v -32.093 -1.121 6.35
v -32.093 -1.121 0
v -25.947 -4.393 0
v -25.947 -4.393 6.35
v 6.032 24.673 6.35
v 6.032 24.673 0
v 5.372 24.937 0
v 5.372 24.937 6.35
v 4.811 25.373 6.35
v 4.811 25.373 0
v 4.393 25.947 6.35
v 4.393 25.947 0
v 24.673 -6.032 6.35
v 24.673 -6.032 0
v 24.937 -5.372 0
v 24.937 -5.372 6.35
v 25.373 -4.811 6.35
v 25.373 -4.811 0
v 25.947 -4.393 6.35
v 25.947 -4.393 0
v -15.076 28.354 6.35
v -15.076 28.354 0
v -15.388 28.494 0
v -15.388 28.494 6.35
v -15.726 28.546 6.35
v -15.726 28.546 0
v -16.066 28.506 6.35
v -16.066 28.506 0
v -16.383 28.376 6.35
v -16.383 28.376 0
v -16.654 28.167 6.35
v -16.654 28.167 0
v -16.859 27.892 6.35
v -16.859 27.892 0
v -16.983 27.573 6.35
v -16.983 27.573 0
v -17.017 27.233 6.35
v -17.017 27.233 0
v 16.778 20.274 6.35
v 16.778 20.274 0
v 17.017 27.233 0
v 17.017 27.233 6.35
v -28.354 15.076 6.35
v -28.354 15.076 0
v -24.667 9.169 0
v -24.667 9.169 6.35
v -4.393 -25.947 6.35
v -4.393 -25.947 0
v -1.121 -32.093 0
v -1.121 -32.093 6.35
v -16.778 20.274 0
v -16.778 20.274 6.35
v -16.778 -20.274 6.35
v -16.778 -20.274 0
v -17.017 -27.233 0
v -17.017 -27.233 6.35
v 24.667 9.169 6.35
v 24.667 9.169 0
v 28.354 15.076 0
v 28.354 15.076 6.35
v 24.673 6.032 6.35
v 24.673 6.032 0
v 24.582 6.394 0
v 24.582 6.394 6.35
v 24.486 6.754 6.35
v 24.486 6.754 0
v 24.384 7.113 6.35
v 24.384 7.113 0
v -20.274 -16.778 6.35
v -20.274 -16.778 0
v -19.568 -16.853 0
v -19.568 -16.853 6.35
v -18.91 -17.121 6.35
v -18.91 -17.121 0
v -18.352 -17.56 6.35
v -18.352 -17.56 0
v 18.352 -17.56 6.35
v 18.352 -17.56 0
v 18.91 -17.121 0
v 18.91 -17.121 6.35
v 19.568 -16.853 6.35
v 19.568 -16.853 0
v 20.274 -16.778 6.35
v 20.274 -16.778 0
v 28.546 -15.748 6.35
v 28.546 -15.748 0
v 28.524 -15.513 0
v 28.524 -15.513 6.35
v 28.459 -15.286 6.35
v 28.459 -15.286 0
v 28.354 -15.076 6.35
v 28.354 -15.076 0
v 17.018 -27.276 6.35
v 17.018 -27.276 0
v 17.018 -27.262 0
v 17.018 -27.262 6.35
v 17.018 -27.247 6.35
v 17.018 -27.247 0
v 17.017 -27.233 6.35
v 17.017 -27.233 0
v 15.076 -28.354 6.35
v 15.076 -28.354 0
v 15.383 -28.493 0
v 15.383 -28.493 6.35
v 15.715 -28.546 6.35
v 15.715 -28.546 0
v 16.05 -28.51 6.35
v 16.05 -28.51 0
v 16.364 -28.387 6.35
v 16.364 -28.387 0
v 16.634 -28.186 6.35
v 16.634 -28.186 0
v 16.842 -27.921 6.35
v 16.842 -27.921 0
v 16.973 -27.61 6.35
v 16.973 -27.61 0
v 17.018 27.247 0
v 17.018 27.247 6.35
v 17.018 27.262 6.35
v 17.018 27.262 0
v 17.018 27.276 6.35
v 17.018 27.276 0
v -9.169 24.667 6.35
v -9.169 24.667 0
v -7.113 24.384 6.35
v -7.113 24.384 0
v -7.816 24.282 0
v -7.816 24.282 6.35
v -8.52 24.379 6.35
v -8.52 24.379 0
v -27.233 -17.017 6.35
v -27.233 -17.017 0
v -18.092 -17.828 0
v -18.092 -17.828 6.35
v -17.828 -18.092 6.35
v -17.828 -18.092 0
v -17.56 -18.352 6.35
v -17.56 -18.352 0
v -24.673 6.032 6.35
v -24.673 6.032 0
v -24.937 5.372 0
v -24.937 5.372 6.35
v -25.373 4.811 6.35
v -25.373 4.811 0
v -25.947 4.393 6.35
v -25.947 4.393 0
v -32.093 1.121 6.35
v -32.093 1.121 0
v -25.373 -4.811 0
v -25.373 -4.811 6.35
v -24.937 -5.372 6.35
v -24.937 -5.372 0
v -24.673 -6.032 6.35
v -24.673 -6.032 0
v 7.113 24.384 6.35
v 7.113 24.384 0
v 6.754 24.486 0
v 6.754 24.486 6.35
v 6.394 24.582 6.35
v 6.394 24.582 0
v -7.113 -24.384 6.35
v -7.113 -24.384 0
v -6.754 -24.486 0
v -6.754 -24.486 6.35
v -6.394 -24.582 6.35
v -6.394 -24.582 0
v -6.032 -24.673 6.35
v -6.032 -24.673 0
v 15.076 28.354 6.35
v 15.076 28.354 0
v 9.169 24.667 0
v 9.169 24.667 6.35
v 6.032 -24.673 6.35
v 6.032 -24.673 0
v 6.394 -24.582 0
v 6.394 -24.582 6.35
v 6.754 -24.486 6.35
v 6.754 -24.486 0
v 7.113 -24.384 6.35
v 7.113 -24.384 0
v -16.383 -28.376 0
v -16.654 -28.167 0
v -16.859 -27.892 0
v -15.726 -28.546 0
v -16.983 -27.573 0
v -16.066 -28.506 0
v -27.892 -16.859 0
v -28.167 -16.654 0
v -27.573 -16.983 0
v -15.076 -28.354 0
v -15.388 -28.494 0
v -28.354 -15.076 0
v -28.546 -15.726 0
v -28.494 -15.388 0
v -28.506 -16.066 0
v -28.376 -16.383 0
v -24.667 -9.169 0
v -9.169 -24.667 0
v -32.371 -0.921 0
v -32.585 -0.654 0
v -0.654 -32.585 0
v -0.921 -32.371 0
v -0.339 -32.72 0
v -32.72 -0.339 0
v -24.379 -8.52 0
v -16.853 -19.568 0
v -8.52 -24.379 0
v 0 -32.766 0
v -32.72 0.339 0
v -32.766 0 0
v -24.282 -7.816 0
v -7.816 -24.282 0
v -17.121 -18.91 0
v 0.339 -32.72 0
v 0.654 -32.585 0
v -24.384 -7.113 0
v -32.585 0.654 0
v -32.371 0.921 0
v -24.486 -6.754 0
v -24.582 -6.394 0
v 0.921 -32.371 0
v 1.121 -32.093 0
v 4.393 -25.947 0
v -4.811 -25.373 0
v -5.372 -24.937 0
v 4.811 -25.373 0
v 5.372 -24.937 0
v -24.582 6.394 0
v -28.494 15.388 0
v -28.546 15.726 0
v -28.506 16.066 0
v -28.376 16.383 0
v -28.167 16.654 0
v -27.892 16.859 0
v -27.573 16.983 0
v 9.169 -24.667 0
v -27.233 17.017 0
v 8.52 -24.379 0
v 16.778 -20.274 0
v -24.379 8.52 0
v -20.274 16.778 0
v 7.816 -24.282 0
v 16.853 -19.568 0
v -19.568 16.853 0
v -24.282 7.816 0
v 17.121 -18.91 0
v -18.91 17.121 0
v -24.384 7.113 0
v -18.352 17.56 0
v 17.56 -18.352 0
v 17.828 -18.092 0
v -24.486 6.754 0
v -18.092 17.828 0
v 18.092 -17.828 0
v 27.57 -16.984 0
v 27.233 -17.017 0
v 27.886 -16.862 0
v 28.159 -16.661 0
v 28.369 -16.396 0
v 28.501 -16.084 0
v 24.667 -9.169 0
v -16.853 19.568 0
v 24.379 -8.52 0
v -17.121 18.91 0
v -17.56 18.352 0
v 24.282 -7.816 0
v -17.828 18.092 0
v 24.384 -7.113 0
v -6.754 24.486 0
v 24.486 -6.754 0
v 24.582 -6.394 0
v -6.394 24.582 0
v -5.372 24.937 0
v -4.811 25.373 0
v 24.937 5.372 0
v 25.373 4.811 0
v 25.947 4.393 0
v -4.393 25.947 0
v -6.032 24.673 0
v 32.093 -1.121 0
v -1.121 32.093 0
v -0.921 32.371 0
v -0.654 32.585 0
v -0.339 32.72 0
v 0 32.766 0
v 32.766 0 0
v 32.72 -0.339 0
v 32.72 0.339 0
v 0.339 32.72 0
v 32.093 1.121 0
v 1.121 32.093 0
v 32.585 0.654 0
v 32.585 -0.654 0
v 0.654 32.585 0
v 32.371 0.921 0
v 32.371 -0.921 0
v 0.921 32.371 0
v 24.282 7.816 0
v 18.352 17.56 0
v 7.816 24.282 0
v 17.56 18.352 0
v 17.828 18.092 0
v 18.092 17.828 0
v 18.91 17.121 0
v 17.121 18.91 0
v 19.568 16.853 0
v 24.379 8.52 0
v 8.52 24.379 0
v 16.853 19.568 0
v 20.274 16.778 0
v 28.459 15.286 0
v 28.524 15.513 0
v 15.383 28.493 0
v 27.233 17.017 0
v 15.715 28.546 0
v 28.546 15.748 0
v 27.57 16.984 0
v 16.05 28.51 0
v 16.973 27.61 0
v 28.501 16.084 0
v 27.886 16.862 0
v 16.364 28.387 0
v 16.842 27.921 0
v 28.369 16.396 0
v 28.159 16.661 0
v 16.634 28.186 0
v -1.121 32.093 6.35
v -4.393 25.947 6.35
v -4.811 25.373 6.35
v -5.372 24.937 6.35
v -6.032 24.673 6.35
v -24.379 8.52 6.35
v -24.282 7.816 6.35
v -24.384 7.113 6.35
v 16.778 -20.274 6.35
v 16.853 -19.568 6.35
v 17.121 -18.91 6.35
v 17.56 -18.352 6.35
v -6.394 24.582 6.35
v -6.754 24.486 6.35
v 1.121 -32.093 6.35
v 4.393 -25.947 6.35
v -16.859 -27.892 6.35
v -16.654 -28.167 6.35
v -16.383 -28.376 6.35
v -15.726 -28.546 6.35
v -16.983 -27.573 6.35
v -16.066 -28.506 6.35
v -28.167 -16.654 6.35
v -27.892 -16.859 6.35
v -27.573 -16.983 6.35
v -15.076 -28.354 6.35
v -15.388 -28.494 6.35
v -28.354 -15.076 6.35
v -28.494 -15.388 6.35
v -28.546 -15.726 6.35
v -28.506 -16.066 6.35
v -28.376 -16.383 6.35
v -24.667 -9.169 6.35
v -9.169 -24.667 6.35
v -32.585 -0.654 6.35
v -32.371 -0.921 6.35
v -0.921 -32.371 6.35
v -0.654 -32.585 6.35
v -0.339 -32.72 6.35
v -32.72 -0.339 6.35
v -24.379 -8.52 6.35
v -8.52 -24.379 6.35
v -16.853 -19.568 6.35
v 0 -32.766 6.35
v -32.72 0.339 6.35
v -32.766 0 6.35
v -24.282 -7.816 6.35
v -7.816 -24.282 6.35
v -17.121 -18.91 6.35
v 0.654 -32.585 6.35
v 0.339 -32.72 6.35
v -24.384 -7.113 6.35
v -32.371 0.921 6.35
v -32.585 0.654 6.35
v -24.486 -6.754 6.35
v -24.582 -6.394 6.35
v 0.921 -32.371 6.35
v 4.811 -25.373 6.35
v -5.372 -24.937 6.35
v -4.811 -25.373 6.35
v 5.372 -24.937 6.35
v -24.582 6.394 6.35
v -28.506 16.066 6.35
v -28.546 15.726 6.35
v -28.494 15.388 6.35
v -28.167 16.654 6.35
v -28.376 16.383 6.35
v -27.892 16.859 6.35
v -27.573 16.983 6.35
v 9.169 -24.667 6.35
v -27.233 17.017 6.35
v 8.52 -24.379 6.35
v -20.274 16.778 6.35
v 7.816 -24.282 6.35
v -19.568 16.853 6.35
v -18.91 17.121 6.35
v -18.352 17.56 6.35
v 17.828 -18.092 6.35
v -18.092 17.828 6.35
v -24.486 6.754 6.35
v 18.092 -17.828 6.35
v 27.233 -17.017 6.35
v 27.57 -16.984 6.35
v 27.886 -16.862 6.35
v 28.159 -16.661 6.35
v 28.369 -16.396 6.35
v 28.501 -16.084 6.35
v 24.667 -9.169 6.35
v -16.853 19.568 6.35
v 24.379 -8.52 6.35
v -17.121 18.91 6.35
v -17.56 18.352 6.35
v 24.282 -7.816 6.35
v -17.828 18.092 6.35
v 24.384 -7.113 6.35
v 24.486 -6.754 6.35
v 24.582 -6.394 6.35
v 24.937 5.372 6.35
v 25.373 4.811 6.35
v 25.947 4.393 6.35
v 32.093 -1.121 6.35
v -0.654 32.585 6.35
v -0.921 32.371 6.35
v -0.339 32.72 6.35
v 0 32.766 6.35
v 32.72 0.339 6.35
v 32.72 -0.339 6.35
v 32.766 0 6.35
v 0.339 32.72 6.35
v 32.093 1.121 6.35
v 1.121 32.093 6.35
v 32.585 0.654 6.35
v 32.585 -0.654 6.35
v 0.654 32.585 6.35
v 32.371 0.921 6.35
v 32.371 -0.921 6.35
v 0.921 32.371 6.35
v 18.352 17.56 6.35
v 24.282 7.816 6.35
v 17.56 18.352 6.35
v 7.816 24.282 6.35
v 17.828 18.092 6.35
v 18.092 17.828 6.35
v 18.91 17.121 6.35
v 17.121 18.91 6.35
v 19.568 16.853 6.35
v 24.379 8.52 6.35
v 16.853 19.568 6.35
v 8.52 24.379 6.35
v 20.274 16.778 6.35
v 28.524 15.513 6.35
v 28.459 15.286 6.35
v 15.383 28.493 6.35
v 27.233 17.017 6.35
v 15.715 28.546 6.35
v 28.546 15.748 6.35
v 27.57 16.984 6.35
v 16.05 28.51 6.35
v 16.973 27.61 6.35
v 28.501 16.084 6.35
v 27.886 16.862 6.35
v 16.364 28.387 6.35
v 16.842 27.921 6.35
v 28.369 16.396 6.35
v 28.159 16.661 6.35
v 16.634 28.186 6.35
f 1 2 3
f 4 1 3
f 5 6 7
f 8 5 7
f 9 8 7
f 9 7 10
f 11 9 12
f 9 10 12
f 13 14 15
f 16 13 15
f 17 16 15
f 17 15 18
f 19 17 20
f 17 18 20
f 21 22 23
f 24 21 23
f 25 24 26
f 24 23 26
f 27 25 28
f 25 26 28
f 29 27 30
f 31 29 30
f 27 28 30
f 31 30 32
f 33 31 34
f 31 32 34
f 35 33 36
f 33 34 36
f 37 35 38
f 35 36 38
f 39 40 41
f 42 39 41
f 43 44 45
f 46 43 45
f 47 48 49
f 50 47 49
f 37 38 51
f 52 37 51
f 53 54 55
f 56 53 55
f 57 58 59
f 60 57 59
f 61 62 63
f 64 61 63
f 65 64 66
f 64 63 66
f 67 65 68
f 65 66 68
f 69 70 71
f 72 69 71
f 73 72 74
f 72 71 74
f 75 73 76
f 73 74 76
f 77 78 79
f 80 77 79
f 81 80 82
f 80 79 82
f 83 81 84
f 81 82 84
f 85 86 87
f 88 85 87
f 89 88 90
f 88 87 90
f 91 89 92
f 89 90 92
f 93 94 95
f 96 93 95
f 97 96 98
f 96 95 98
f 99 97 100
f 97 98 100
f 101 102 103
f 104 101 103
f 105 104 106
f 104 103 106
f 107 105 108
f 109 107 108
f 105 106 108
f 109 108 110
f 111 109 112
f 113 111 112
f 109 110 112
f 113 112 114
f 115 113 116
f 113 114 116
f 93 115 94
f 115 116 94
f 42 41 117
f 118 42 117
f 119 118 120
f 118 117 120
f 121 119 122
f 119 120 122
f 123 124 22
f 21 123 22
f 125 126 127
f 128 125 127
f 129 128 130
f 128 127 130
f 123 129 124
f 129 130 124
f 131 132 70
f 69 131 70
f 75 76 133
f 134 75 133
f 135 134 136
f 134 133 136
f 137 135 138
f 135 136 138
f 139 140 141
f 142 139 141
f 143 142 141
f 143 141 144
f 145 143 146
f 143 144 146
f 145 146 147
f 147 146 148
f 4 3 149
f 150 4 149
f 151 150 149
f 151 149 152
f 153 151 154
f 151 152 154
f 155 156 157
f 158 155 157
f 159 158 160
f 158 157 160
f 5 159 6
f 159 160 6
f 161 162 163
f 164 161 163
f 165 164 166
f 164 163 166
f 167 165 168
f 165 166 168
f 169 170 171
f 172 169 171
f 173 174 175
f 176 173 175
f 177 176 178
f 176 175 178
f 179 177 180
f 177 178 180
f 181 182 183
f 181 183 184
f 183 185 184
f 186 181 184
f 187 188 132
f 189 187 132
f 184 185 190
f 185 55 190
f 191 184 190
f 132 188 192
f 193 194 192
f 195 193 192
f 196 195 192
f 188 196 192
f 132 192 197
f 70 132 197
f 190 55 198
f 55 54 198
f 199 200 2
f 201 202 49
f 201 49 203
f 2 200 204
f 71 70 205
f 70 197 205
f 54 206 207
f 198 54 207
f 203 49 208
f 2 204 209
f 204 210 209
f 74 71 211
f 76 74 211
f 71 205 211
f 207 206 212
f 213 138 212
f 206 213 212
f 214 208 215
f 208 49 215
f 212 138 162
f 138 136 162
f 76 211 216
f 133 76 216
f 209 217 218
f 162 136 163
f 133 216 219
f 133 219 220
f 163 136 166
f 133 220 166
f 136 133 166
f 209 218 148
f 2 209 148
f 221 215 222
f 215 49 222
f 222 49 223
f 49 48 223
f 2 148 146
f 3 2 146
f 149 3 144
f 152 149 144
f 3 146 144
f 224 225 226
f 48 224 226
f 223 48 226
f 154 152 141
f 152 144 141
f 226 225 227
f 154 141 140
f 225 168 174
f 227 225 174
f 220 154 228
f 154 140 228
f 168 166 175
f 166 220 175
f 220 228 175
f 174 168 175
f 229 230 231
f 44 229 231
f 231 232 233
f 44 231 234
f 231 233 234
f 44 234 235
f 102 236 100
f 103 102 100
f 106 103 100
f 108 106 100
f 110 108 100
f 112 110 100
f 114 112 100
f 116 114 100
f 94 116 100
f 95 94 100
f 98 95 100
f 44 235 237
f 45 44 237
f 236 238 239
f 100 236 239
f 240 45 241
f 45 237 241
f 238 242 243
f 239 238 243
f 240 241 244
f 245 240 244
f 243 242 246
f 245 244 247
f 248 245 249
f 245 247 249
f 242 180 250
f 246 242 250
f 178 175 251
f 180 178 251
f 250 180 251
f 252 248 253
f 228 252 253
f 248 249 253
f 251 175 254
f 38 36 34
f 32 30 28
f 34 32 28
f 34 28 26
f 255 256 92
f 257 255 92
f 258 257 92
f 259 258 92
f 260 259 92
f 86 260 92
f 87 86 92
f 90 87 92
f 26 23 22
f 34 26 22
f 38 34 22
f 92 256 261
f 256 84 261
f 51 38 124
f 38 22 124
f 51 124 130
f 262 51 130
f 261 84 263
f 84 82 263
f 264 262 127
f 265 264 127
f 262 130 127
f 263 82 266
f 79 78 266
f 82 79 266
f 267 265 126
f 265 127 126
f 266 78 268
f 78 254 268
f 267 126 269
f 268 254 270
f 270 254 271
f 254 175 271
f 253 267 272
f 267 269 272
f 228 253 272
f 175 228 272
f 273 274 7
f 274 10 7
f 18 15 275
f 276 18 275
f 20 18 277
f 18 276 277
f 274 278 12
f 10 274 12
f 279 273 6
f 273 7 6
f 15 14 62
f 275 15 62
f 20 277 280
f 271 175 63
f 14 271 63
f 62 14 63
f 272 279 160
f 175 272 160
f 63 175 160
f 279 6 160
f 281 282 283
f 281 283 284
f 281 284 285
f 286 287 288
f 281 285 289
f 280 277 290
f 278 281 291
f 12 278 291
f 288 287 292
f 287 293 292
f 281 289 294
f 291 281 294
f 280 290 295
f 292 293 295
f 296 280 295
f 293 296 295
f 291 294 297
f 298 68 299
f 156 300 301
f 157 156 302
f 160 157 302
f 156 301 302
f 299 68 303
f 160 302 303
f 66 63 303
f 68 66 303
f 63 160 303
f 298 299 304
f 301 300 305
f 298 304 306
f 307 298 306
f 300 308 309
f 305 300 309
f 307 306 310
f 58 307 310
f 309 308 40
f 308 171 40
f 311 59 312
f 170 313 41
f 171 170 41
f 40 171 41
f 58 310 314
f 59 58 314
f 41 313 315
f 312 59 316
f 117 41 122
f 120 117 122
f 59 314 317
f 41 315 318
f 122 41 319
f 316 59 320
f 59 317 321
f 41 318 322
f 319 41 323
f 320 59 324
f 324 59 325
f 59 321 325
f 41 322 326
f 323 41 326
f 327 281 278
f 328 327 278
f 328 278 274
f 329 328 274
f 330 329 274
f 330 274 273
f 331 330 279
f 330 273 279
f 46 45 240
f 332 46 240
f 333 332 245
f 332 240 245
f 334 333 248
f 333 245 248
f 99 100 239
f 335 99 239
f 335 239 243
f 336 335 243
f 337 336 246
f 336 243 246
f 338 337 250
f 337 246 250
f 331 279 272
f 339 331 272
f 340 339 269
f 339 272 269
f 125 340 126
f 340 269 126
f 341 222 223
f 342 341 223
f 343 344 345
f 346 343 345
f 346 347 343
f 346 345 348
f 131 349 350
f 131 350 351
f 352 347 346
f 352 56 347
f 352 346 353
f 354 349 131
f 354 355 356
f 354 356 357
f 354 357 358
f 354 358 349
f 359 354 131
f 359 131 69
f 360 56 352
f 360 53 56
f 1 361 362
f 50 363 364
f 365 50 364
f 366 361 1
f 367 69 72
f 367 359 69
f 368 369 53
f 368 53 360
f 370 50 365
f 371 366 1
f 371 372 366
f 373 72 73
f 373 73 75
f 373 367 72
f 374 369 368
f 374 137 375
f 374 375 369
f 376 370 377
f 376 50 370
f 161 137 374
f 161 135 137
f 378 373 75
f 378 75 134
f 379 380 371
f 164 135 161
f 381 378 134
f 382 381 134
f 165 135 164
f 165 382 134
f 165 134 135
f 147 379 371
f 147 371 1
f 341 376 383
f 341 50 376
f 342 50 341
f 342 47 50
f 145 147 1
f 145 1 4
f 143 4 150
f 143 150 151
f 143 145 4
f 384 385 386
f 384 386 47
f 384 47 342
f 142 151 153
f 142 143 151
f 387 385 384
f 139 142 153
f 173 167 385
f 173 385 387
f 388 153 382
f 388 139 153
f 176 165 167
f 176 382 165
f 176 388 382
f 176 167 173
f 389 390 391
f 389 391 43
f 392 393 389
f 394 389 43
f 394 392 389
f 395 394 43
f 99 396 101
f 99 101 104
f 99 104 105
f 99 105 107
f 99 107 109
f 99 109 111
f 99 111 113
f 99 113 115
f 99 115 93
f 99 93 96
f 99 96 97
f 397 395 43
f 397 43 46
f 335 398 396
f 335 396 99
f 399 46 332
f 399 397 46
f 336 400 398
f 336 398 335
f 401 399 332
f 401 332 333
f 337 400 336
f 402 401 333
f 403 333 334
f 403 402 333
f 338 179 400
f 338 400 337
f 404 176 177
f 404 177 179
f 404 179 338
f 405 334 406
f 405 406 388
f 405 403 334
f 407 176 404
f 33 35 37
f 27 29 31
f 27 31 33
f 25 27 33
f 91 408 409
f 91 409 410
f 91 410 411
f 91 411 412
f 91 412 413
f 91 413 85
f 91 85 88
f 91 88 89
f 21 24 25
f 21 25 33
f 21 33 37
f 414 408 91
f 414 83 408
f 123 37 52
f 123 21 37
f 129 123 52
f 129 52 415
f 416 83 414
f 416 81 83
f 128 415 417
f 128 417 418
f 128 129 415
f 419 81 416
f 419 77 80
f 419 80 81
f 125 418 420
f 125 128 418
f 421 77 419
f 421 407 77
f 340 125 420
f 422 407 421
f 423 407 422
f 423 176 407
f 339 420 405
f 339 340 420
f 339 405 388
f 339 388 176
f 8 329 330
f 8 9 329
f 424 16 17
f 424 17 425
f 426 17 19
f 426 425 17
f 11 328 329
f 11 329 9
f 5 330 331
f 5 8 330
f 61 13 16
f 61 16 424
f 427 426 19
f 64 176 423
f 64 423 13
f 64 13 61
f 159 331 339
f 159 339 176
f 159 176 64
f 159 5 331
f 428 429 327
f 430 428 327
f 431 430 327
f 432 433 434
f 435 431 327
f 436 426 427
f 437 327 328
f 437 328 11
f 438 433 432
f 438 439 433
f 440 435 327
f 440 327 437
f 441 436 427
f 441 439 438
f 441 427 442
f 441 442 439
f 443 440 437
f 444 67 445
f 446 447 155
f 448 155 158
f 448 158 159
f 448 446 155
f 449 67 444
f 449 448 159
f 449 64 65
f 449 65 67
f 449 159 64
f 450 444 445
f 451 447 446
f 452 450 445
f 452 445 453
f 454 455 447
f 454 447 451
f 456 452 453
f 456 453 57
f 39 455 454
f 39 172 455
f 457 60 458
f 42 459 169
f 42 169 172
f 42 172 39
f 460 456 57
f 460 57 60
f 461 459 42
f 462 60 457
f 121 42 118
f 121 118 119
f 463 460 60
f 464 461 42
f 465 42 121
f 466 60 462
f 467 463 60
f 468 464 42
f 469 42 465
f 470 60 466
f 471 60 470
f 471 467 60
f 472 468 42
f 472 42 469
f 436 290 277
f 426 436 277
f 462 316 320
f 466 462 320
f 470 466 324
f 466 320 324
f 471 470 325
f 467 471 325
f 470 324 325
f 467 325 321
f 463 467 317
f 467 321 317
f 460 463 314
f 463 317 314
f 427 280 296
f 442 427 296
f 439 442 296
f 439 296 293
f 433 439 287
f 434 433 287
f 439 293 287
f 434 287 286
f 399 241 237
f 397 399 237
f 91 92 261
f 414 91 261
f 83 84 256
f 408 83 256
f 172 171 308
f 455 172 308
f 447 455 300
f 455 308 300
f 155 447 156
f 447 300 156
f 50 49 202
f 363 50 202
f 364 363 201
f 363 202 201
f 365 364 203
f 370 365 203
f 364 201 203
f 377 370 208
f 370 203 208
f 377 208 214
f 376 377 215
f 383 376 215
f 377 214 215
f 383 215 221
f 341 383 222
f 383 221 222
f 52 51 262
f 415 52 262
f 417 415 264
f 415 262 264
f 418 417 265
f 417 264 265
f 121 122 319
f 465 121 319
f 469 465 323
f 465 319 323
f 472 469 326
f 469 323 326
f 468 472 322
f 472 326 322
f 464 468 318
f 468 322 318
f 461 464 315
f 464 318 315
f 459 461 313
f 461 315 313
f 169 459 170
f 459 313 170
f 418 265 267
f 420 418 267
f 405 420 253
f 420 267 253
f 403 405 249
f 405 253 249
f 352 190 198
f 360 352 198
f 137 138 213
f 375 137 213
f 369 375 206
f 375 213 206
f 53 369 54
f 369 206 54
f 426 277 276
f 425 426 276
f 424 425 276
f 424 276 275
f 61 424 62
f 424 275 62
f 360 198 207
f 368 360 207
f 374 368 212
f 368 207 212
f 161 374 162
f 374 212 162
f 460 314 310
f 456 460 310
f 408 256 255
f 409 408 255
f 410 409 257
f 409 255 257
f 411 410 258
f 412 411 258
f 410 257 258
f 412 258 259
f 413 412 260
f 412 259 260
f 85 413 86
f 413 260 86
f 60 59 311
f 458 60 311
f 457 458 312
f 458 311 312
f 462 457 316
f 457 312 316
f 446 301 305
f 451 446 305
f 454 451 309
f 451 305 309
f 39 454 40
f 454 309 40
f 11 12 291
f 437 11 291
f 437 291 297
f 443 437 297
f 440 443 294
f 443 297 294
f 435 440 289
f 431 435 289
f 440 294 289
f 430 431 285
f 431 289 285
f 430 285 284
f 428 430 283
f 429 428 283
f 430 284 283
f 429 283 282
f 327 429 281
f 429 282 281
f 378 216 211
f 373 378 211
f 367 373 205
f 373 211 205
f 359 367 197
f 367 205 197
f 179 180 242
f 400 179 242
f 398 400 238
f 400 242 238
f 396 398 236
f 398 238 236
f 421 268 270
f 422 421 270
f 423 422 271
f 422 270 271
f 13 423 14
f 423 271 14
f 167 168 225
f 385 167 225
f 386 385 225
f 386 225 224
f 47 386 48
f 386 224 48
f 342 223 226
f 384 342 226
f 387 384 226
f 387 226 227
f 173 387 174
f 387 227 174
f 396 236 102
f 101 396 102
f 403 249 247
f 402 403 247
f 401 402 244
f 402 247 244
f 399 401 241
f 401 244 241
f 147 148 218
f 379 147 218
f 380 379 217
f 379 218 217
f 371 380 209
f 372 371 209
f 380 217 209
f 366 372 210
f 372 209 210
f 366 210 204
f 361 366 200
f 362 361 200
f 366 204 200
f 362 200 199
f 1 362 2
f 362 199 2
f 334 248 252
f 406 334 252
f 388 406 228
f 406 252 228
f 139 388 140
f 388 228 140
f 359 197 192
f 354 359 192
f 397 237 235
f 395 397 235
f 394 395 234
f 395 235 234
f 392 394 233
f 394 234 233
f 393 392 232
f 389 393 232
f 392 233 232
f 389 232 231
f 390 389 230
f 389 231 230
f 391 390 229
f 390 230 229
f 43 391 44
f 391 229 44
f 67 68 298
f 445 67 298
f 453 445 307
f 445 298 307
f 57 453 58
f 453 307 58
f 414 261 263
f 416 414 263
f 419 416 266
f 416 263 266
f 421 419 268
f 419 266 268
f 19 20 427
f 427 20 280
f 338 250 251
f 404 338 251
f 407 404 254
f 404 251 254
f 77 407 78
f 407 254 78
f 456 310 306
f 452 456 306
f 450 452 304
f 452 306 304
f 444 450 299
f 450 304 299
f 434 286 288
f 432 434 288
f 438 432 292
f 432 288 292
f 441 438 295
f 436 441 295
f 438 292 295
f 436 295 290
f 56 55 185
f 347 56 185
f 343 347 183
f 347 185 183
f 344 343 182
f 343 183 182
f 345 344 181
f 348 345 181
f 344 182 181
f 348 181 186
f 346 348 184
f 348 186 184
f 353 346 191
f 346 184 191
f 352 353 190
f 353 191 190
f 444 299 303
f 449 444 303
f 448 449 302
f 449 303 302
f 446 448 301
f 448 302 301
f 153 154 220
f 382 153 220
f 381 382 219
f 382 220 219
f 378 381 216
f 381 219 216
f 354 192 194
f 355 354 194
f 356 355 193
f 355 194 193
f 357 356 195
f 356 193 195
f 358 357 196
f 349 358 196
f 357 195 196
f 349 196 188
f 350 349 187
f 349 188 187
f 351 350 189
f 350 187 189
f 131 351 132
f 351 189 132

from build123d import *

# Parameters (mm, degrees)
F1_DEPTH = 6.35


with BuildPart() as f1:
    # F0 (on Top) → F1 (new body)
    with BuildSketch(Plane.XY):
        with BuildLine():
            ThreePointArc((-4.39292013, 25.9471153947), (-5.0763171932, 25.1352197323), (-6.031797544, 24.6734152153))
            ThreePointArc((-6.031797544, 24.6734152153), (-6.5740037456, 24.5345159877), (-7.1130177041, 24.3837031466))
            ThreePointArc((-7.1130177041, 24.3837031466), (-12.7, 21.9970452561), (-17.5603975113, 18.3519056026))
            ThreePointArc((-17.5603975113, 18.3519056026), (-17.9605122421, 17.9605122421), (-18.3519056026, 17.5603975113))
            ThreePointArc((-18.3519056026, 17.5603975113), (-21.9970452561, 12.7), (-24.3837031466, 7.1130177041))
            ThreePointArc((-24.3837031466, 7.1130177041), (-24.5345159877, 6.5740037456), (-24.6734152153, 6.031797544))
            ThreePointArc((-24.6734152153, 6.031797544), (-25.4, 0), (-24.6734152153, -6.031797544))
            ThreePointArc((-24.6734152153, -6.031797544), (-24.5345159877, -6.5740037456), (-24.3837031466, -7.1130177041))
            ThreePointArc((-24.3837031466, -7.1130177041), (-21.9970452561, -12.7), (-18.3519056026, -17.5603975113))
            ThreePointArc((-18.3519056026, -17.5603975113), (-17.9605122421, -17.9605122421), (-17.5603975113, -18.3519056026))
            ThreePointArc((-17.5603975113, -18.3519056026), (-12.7, -21.9970452561), (-7.1130177041, -24.3837031466))
            ThreePointArc((-7.1130177041, -24.3837031466), (-6.5740037456, -24.5345159877), (-6.031797544, -24.6734152153))
            ThreePointArc((-6.031797544, -24.6734152153), (0, -25.4), (6.031797544, -24.6734152153))
            ThreePointArc((6.031797544, -24.6734152153), (6.5740037456, -24.5345159877), (7.1130177041, -24.3837031466))
            ThreePointArc((7.1130177041, -24.3837031466), (12.7, -21.9970452561), (17.5603975113, -18.3519056026))
            ThreePointArc((17.5603975113, -18.3519056026), (17.9605122421, -17.9605122421), (18.3519056026, -17.5603975113))
            ThreePointArc((18.3519056026, -17.5603975113), (21.9970452561, -12.7), (24.3837031466, -7.1130177041))
            ThreePointArc((24.3837031466, -7.1130177041), (24.5345159877, -6.5740037456), (24.6734152153, -6.031797544))
            ThreePointArc((24.6734152153, -6.031797544), (25.4, 0), (24.6734152153, 6.031797544))
            ThreePointArc((24.6734152153, 6.031797544), (24.5345159877, 6.5740037456), (24.3837031466, 7.1130177041))
            ThreePointArc((24.3837031466, 7.1130177041), (21.9970452561, 12.7), (18.3519056026, 17.5603975113))
            ThreePointArc((18.3519056026, 17.5603975113), (17.9605122421, 17.9605122421), (17.5603975113, 18.3519056026))
            ThreePointArc((17.5603975113, 18.3519056026), (12.7, 21.9970452561), (7.1130177041, 24.3837031466))
            ThreePointArc((7.1130177041, 24.3837031466), (6.5740037456, 24.5345159877), (6.031797544, 24.6734152153))
            ThreePointArc((6.031797544, 24.6734152153), (5.0763171932, 25.1352197323), (4.39292013, 25.9471153947))
            Line((4.39292013, 25.9471153947), (1.1210285842, 32.0928206711))
            ThreePointArc((1.1210285842, 32.0928206711), (1.2321944453, 31.8035660076), (1.27, 31.496))
            ThreePointArc((1.27, 31.496), (0.8980256121, 30.5979743879), (0, 30.226))
            ThreePointArc((0, 30.226), (-1.0887750576, 30.8421889616), (-1.1210285842, 32.0928206711))
            Line((-1.1210285842, 32.0928206711), (-4.39292013, 25.9471153947))
        make_face()
        with BuildLine():
            ThreePointArc((-17.5603975113, 18.3519056026), (-12.7, 21.9970452561), (-7.1130177041, 24.3837031466))
            ThreePointArc((-7.1130177041, 24.3837031466), (-8.1713902192, 24.3058974145), (-9.169177268, 24.6673211518))
            Line((-9.169177268, 24.6673211518), (-15.0755711033, 28.3537122723))
            ThreePointArc((-15.0755711033, 28.3537122723), (-14.6373955027, 27.8923374573), (-14.478, 27.2763361176))
            ThreePointArc((-14.478, 27.2763361176), (-15.7261705603, 26.0065237395), (-17.0172495678, 27.2326836881))
            Line((-17.0172495678, 27.2326836881), (-16.7779381267, 20.2744010218))
            ThreePointArc((-16.7779381267, 20.2744010218), (-16.9638295132, 19.2295802213), (-17.5603975113, 18.3519056026))
        make_face()
        with BuildLine():
            ThreePointArc((1.1210285842, 32.0928206711), (0, 32.766), (-1.1210285842, 32.0928206711))
            ThreePointArc((-1.1210285842, 32.0928206711), (-1.0887750576, 30.8421889616), (0, 30.226))
            ThreePointArc((0, 30.226), (0.8980256121, 30.5979743879), (1.27, 31.496))
            ThreePointArc((1.27, 31.496), (1.2321944453, 31.8035660076), (1.1210285842, 32.0928206711))
        make_face()
        with BuildLine():
            ThreePointArc((-24.3837031466, 7.1130177041), (-21.9970452561, 12.7), (-18.3519056026, 17.5603975113))
            ThreePointArc((-18.3519056026, 17.5603975113), (-19.2295802213, 16.9638295132), (-20.2744010218, 16.7779381267))
            Line((-20.2744010218, 16.7779381267), (-27.2326836881, 17.0172495678))
            ThreePointArc((-27.2326836881, 17.0172495678), (-26.3630074294, 16.6304571986), (-26.0063361176, 15.748))
            ThreePointArc((-26.0063361176, 15.748), (-26.9265988709, 14.5271053042), (-28.3537122723, 15.0755711033))
            Line((-28.3537122723, 15.0755711033), (-24.6673211518, 9.169177268))
            ThreePointArc((-24.6673211518, 9.169177268), (-24.3058974145, 8.1713902192), (-24.3837031466, 7.1130177041))
        make_face()
        with BuildLine():
            ThreePointArc((-14.478, 27.2763361176), (-14.6373955027, 27.8923374573), (-15.0755711033, 28.3537122723))
            ThreePointArc((-15.0755711033, 28.3537122723), (-16.383, 28.3761883804), (-17.0172495678, 27.2326836881))
            ThreePointArc((-17.0172495678, 27.2326836881), (-15.7261705603, 26.0065237395), (-14.478, 27.2763361176))
        make_face()
        with BuildLine():
            ThreePointArc((-24.6734152153, -6.031797544), (-25.4, 0), (-24.6734152153, 6.031797544))
            ThreePointArc((-24.6734152153, 6.031797544), (-25.1352197323, 5.0763171932), (-25.9471153947, 4.39292013))
            Line((-25.9471153947, 4.39292013), (-32.0928206711, 1.1210285842))
            ThreePointArc((-32.0928206711, 1.1210285842), (-30.8421889616, 1.0887750576), (-30.226, 0))
            ThreePointArc((-30.226, 0), (-30.8421889616, -1.0887750576), (-32.0928206711, -1.1210285842))
            Line((-32.0928206711, -1.1210285842), (-25.9471153947, -4.39292013))
            ThreePointArc((-25.9471153947, -4.39292013), (-25.1352197323, -5.0763171932), (-24.6734152153, -6.031797544))
        make_face()
        with BuildLine():
            ThreePointArc((-26.0063361176, 15.748), (-26.3630074294, 16.6304571986), (-27.2326836881, 17.0172495678))
            ThreePointArc((-27.2326836881, 17.0172495678), (-28.3761883804, 16.383), (-28.3537122723, 15.0755711033))
            ThreePointArc((-28.3537122723, 15.0755711033), (-26.9265988709, 14.5271053042), (-26.0063361176, 15.748))
        make_face()
        with BuildLine():
            ThreePointArc((9.169177268, 24.6673211518), (8.1713902192, 24.3058974145), (7.1130177041, 24.3837031466))
            ThreePointArc((7.1130177041, 24.3837031466), (12.7, 21.9970452561), (17.5603975113, 18.3519056026))
            ThreePointArc((17.5603975113, 18.3519056026), (16.9638295132, 19.2295802213), (16.7779381267, 20.2744010218))
            Line((16.7779381267, 20.2744010218), (17.0172495678, 27.2326836881))
            ThreePointArc((17.0172495678, 27.2326836881), (15.113, 26.1764838548), (15.0755711033, 28.3537122723))
            Line((15.0755711033, 28.3537122723), (9.169177268, 24.6673211518))
        make_face()
        with BuildLine():
            ThreePointArc((-18.3519056026, -17.5603975113), (-21.9970452561, -12.7), (-24.3837031466, -7.1130177041))
            ThreePointArc((-24.3837031466, -7.1130177041), (-24.3058974145, -8.1713902192), (-24.6673211518, -9.169177268))
            Line((-24.6673211518, -9.169177268), (-28.3537122723, -15.0755711033))
            ThreePointArc((-28.3537122723, -15.0755711033), (-26.9265988709, -14.5271053042), (-26.0063361176, -15.748))
            ThreePointArc((-26.0063361176, -15.748), (-26.3630074294, -16.6304571986), (-27.2326836881, -17.0172495678))
            Line((-27.2326836881, -17.0172495678), (-20.2744010218, -16.7779381267))
            ThreePointArc((-20.2744010218, -16.7779381267), (-19.2295802213, -16.9638295132), (-18.3519056026, -17.5603975113))
        make_face()
        with BuildLine():
            ThreePointArc((-30.226, 0), (-30.8421889616, 1.0887750576), (-32.0928206711, 1.1210285842))
            ThreePointArc((-32.0928206711, 1.1210285842), (-32.766, 0), (-32.0928206711, -1.1210285842))
            ThreePointArc((-32.0928206711, -1.1210285842), (-30.8421889616, -1.0887750576), (-30.226, 0))
        make_face()
        with BuildLine():
            ThreePointArc((20.2744010218, 16.7779381267), (19.2295802213, 16.9638295132), (18.3519056026, 17.5603975113))
            ThreePointArc((18.3519056026, 17.5603975113), (21.9970452561, 12.7), (24.3837031466, 7.1130177041))
            ThreePointArc((24.3837031466, 7.1130177041), (24.3058974145, 8.1713902192), (24.6673211518, 9.169177268))
            Line((24.6673211518, 9.169177268), (28.3537122723, 15.0755711033))
            ThreePointArc((28.3537122723, 15.0755711033), (26.1764838548, 15.113), (27.2326836881, 17.0172495678))
            Line((27.2326836881, 17.0172495678), (20.2744010218, 16.7779381267))
        make_face()
        with BuildLine():
            ThreePointArc((17.018, 27.2763361176), (16.3640013397, 28.3869406149), (15.0755711033, 28.3537122723))
            ThreePointArc((15.0755711033, 28.3537122723), (15.113, 26.1764838548), (17.0172495678, 27.2326836881))
            ThreePointArc((17.0172495678, 27.2326836881), (17.0178123781, 27.2545066779), (17.018, 27.2763361176))
        make_face()
        with BuildLine():
            ThreePointArc((-7.1130177041, -24.3837031466), (-12.7, -21.9970452561), (-17.5603975113, -18.3519056026))
            ThreePointArc((-17.5603975113, -18.3519056026), (-16.9638295132, -19.2295802213), (-16.7779381267, -20.2744010218))
            Line((-16.7779381267, -20.2744010218), (-17.0172495678, -27.2326836881))
            ThreePointArc((-17.0172495678, -27.2326836881), (-15.7261705603, -26.0065237395), (-14.478, -27.2763361176))
            ThreePointArc((-14.478, -27.2763361176), (-14.6373955027, -27.8923374573), (-15.0755711033, -28.3537122723))
            Line((-15.0755711033, -28.3537122723), (-9.169177268, -24.6673211518))
            ThreePointArc((-9.169177268, -24.6673211518), (-8.1713902192, -24.3058974145), (-7.1130177041, -24.3837031466))
        make_face()
        with BuildLine():
            ThreePointArc((-26.0063361176, -15.748), (-26.9265988709, -14.5271053042), (-28.3537122723, -15.0755711033))
            ThreePointArc((-28.3537122723, -15.0755711033), (-28.3761883804, -16.383), (-27.2326836881, -17.0172495678))
            ThreePointArc((-27.2326836881, -17.0172495678), (-26.3630074294, -16.6304571986), (-26.0063361176, -15.748))
        make_face()
        with BuildLine():
            ThreePointArc((25.9471153947, 4.39292013), (25.1352197323, 5.0763171932), (24.6734152153, 6.031797544))
            ThreePointArc((24.6734152153, 6.031797544), (25.4, 0), (24.6734152153, -6.031797544))
            ThreePointArc((24.6734152153, -6.031797544), (25.1352197323, -5.0763171932), (25.9471153947, -4.39292013))
            Line((25.9471153947, -4.39292013), (32.0928206711, -1.1210285842))
            ThreePointArc((32.0928206711, -1.1210285842), (30.226, 0), (32.0928206711, 1.1210285842))
            Line((32.0928206711, 1.1210285842), (25.9471153947, 4.39292013))
        make_face()
        with BuildLine():
            ThreePointArc((28.5463361176, 15.748), (28.1587933162, 16.6613286882), (27.2326836881, 17.0172495678))
            ThreePointArc((27.2326836881, 17.0172495678), (26.1764838548, 15.113), (28.3537122723, 15.0755711033))
            ThreePointArc((28.3537122723, 15.0755711033), (28.4972308134, 15.3982627533), (28.5463361176, 15.748))
        make_face()
        with BuildLine():
            ThreePointArc((6.031797544, -24.6734152153), (0, -25.4), (-6.031797544, -24.6734152153))
            ThreePointArc((-6.031797544, -24.6734152153), (-5.0763171932, -25.1352197323), (-4.39292013, -25.9471153947))
            Line((-4.39292013, -25.9471153947), (-1.1210285842, -32.0928206711))
            ThreePointArc((-1.1210285842, -32.0928206711), (-0.3075660076, -30.2638055547), (1.27, -31.496))
            ThreePointArc((1.27, -31.496), (1.2321944453, -31.8035660076), (1.1210285842, -32.0928206711))
            Line((1.1210285842, -32.0928206711), (4.39292013, -25.9471153947))
            ThreePointArc((4.39292013, -25.9471153947), (5.0763171932, -25.1352197323), (6.031797544, -24.6734152153))
        make_face()
        with BuildLine():
            ThreePointArc((-14.478, -27.2763361176), (-15.7261705603, -26.0065237395), (-17.0172495678, -27.2326836881))
            ThreePointArc((-17.0172495678, -27.2326836881), (-16.383, -28.3761883804), (-15.0755711033, -28.3537122723))
            ThreePointArc((-15.0755711033, -28.3537122723), (-14.6373955027, -27.8923374573), (-14.478, -27.2763361176))
        make_face()
        with BuildLine():
            ThreePointArc((24.6673211518, -9.169177268), (24.3058974145, -8.1713902192), (24.3837031466, -7.1130177041))
            ThreePointArc((24.3837031466, -7.1130177041), (21.9970452561, -12.7), (18.3519056026, -17.5603975113))
            ThreePointArc((18.3519056026, -17.5603975113), (19.2295802213, -16.9638295132), (20.2744010218, -16.7779381267))
            Line((20.2744010218, -16.7779381267), (27.2326836881, -17.0172495678))
            ThreePointArc((27.2326836881, -17.0172495678), (26.1764838548, -15.113), (28.3537122723, -15.0755711033))
            Line((28.3537122723, -15.0755711033), (24.6673211518, -9.169177268))
        make_face()
        with BuildLine():
            ThreePointArc((32.766, 0), (32.5847750576, 0.6538110384), (32.0928206711, 1.1210285842))
            ThreePointArc((32.0928206711, 1.1210285842), (30.226, 0), (32.0928206711, -1.1210285842))
            ThreePointArc((32.0928206711, -1.1210285842), (32.5847750576, -0.6538110384), (32.766, 0))
        make_face()
        with BuildLine():
            ThreePointArc((17.5603975113, -18.3519056026), (12.7, -21.9970452561), (7.1130177041, -24.3837031466))
            ThreePointArc((7.1130177041, -24.3837031466), (8.1713902192, -24.3058974145), (9.169177268, -24.6673211518))
            Line((9.169177268, -24.6673211518), (15.0755711033, -28.3537122723))
            ThreePointArc((15.0755711033, -28.3537122723), (15.113, -26.1764838548), (17.0172495678, -27.2326836881))
            Line((17.0172495678, -27.2326836881), (16.7779381267, -20.2744010218))
            ThreePointArc((16.7779381267, -20.2744010218), (16.9638295132, -19.2295802213), (17.5603975113, -18.3519056026))
        make_face()
        with BuildLine():
            ThreePointArc((1.27, -31.496), (-0.3075660076, -30.2638055547), (-1.1210285842, -32.0928206711))
            ThreePointArc((-1.1210285842, -32.0928206711), (0, -32.766), (1.1210285842, -32.0928206711))
            ThreePointArc((1.1210285842, -32.0928206711), (1.2321944453, -31.8035660076), (1.27, -31.496))
        make_face()
        with BuildLine():
            ThreePointArc((28.5463361176, -15.748), (28.4972308134, -15.3982627533), (28.3537122723, -15.0755711033))
            ThreePointArc((28.3537122723, -15.0755711033), (26.1764838548, -15.113), (27.2326836881, -17.0172495678))
            ThreePointArc((27.2326836881, -17.0172495678), (28.1587933162, -16.6613286882), (28.5463361176, -15.748))
        make_face()
        with BuildLine():
            ThreePointArc((17.0172495678, -27.2326836881), (15.113, -26.1764838548), (15.0755711033, -28.3537122723))
            ThreePointArc((15.0755711033, -28.3537122723), (16.3640013397, -28.3869406149), (17.018, -27.2763361176))
            ThreePointArc((17.018, -27.2763361176), (17.0178123781, -27.2545066779), (17.0172495678, -27.2326836881))
        make_face()
    extrude(amount=F1_DEPTH)


solid = f1.part
